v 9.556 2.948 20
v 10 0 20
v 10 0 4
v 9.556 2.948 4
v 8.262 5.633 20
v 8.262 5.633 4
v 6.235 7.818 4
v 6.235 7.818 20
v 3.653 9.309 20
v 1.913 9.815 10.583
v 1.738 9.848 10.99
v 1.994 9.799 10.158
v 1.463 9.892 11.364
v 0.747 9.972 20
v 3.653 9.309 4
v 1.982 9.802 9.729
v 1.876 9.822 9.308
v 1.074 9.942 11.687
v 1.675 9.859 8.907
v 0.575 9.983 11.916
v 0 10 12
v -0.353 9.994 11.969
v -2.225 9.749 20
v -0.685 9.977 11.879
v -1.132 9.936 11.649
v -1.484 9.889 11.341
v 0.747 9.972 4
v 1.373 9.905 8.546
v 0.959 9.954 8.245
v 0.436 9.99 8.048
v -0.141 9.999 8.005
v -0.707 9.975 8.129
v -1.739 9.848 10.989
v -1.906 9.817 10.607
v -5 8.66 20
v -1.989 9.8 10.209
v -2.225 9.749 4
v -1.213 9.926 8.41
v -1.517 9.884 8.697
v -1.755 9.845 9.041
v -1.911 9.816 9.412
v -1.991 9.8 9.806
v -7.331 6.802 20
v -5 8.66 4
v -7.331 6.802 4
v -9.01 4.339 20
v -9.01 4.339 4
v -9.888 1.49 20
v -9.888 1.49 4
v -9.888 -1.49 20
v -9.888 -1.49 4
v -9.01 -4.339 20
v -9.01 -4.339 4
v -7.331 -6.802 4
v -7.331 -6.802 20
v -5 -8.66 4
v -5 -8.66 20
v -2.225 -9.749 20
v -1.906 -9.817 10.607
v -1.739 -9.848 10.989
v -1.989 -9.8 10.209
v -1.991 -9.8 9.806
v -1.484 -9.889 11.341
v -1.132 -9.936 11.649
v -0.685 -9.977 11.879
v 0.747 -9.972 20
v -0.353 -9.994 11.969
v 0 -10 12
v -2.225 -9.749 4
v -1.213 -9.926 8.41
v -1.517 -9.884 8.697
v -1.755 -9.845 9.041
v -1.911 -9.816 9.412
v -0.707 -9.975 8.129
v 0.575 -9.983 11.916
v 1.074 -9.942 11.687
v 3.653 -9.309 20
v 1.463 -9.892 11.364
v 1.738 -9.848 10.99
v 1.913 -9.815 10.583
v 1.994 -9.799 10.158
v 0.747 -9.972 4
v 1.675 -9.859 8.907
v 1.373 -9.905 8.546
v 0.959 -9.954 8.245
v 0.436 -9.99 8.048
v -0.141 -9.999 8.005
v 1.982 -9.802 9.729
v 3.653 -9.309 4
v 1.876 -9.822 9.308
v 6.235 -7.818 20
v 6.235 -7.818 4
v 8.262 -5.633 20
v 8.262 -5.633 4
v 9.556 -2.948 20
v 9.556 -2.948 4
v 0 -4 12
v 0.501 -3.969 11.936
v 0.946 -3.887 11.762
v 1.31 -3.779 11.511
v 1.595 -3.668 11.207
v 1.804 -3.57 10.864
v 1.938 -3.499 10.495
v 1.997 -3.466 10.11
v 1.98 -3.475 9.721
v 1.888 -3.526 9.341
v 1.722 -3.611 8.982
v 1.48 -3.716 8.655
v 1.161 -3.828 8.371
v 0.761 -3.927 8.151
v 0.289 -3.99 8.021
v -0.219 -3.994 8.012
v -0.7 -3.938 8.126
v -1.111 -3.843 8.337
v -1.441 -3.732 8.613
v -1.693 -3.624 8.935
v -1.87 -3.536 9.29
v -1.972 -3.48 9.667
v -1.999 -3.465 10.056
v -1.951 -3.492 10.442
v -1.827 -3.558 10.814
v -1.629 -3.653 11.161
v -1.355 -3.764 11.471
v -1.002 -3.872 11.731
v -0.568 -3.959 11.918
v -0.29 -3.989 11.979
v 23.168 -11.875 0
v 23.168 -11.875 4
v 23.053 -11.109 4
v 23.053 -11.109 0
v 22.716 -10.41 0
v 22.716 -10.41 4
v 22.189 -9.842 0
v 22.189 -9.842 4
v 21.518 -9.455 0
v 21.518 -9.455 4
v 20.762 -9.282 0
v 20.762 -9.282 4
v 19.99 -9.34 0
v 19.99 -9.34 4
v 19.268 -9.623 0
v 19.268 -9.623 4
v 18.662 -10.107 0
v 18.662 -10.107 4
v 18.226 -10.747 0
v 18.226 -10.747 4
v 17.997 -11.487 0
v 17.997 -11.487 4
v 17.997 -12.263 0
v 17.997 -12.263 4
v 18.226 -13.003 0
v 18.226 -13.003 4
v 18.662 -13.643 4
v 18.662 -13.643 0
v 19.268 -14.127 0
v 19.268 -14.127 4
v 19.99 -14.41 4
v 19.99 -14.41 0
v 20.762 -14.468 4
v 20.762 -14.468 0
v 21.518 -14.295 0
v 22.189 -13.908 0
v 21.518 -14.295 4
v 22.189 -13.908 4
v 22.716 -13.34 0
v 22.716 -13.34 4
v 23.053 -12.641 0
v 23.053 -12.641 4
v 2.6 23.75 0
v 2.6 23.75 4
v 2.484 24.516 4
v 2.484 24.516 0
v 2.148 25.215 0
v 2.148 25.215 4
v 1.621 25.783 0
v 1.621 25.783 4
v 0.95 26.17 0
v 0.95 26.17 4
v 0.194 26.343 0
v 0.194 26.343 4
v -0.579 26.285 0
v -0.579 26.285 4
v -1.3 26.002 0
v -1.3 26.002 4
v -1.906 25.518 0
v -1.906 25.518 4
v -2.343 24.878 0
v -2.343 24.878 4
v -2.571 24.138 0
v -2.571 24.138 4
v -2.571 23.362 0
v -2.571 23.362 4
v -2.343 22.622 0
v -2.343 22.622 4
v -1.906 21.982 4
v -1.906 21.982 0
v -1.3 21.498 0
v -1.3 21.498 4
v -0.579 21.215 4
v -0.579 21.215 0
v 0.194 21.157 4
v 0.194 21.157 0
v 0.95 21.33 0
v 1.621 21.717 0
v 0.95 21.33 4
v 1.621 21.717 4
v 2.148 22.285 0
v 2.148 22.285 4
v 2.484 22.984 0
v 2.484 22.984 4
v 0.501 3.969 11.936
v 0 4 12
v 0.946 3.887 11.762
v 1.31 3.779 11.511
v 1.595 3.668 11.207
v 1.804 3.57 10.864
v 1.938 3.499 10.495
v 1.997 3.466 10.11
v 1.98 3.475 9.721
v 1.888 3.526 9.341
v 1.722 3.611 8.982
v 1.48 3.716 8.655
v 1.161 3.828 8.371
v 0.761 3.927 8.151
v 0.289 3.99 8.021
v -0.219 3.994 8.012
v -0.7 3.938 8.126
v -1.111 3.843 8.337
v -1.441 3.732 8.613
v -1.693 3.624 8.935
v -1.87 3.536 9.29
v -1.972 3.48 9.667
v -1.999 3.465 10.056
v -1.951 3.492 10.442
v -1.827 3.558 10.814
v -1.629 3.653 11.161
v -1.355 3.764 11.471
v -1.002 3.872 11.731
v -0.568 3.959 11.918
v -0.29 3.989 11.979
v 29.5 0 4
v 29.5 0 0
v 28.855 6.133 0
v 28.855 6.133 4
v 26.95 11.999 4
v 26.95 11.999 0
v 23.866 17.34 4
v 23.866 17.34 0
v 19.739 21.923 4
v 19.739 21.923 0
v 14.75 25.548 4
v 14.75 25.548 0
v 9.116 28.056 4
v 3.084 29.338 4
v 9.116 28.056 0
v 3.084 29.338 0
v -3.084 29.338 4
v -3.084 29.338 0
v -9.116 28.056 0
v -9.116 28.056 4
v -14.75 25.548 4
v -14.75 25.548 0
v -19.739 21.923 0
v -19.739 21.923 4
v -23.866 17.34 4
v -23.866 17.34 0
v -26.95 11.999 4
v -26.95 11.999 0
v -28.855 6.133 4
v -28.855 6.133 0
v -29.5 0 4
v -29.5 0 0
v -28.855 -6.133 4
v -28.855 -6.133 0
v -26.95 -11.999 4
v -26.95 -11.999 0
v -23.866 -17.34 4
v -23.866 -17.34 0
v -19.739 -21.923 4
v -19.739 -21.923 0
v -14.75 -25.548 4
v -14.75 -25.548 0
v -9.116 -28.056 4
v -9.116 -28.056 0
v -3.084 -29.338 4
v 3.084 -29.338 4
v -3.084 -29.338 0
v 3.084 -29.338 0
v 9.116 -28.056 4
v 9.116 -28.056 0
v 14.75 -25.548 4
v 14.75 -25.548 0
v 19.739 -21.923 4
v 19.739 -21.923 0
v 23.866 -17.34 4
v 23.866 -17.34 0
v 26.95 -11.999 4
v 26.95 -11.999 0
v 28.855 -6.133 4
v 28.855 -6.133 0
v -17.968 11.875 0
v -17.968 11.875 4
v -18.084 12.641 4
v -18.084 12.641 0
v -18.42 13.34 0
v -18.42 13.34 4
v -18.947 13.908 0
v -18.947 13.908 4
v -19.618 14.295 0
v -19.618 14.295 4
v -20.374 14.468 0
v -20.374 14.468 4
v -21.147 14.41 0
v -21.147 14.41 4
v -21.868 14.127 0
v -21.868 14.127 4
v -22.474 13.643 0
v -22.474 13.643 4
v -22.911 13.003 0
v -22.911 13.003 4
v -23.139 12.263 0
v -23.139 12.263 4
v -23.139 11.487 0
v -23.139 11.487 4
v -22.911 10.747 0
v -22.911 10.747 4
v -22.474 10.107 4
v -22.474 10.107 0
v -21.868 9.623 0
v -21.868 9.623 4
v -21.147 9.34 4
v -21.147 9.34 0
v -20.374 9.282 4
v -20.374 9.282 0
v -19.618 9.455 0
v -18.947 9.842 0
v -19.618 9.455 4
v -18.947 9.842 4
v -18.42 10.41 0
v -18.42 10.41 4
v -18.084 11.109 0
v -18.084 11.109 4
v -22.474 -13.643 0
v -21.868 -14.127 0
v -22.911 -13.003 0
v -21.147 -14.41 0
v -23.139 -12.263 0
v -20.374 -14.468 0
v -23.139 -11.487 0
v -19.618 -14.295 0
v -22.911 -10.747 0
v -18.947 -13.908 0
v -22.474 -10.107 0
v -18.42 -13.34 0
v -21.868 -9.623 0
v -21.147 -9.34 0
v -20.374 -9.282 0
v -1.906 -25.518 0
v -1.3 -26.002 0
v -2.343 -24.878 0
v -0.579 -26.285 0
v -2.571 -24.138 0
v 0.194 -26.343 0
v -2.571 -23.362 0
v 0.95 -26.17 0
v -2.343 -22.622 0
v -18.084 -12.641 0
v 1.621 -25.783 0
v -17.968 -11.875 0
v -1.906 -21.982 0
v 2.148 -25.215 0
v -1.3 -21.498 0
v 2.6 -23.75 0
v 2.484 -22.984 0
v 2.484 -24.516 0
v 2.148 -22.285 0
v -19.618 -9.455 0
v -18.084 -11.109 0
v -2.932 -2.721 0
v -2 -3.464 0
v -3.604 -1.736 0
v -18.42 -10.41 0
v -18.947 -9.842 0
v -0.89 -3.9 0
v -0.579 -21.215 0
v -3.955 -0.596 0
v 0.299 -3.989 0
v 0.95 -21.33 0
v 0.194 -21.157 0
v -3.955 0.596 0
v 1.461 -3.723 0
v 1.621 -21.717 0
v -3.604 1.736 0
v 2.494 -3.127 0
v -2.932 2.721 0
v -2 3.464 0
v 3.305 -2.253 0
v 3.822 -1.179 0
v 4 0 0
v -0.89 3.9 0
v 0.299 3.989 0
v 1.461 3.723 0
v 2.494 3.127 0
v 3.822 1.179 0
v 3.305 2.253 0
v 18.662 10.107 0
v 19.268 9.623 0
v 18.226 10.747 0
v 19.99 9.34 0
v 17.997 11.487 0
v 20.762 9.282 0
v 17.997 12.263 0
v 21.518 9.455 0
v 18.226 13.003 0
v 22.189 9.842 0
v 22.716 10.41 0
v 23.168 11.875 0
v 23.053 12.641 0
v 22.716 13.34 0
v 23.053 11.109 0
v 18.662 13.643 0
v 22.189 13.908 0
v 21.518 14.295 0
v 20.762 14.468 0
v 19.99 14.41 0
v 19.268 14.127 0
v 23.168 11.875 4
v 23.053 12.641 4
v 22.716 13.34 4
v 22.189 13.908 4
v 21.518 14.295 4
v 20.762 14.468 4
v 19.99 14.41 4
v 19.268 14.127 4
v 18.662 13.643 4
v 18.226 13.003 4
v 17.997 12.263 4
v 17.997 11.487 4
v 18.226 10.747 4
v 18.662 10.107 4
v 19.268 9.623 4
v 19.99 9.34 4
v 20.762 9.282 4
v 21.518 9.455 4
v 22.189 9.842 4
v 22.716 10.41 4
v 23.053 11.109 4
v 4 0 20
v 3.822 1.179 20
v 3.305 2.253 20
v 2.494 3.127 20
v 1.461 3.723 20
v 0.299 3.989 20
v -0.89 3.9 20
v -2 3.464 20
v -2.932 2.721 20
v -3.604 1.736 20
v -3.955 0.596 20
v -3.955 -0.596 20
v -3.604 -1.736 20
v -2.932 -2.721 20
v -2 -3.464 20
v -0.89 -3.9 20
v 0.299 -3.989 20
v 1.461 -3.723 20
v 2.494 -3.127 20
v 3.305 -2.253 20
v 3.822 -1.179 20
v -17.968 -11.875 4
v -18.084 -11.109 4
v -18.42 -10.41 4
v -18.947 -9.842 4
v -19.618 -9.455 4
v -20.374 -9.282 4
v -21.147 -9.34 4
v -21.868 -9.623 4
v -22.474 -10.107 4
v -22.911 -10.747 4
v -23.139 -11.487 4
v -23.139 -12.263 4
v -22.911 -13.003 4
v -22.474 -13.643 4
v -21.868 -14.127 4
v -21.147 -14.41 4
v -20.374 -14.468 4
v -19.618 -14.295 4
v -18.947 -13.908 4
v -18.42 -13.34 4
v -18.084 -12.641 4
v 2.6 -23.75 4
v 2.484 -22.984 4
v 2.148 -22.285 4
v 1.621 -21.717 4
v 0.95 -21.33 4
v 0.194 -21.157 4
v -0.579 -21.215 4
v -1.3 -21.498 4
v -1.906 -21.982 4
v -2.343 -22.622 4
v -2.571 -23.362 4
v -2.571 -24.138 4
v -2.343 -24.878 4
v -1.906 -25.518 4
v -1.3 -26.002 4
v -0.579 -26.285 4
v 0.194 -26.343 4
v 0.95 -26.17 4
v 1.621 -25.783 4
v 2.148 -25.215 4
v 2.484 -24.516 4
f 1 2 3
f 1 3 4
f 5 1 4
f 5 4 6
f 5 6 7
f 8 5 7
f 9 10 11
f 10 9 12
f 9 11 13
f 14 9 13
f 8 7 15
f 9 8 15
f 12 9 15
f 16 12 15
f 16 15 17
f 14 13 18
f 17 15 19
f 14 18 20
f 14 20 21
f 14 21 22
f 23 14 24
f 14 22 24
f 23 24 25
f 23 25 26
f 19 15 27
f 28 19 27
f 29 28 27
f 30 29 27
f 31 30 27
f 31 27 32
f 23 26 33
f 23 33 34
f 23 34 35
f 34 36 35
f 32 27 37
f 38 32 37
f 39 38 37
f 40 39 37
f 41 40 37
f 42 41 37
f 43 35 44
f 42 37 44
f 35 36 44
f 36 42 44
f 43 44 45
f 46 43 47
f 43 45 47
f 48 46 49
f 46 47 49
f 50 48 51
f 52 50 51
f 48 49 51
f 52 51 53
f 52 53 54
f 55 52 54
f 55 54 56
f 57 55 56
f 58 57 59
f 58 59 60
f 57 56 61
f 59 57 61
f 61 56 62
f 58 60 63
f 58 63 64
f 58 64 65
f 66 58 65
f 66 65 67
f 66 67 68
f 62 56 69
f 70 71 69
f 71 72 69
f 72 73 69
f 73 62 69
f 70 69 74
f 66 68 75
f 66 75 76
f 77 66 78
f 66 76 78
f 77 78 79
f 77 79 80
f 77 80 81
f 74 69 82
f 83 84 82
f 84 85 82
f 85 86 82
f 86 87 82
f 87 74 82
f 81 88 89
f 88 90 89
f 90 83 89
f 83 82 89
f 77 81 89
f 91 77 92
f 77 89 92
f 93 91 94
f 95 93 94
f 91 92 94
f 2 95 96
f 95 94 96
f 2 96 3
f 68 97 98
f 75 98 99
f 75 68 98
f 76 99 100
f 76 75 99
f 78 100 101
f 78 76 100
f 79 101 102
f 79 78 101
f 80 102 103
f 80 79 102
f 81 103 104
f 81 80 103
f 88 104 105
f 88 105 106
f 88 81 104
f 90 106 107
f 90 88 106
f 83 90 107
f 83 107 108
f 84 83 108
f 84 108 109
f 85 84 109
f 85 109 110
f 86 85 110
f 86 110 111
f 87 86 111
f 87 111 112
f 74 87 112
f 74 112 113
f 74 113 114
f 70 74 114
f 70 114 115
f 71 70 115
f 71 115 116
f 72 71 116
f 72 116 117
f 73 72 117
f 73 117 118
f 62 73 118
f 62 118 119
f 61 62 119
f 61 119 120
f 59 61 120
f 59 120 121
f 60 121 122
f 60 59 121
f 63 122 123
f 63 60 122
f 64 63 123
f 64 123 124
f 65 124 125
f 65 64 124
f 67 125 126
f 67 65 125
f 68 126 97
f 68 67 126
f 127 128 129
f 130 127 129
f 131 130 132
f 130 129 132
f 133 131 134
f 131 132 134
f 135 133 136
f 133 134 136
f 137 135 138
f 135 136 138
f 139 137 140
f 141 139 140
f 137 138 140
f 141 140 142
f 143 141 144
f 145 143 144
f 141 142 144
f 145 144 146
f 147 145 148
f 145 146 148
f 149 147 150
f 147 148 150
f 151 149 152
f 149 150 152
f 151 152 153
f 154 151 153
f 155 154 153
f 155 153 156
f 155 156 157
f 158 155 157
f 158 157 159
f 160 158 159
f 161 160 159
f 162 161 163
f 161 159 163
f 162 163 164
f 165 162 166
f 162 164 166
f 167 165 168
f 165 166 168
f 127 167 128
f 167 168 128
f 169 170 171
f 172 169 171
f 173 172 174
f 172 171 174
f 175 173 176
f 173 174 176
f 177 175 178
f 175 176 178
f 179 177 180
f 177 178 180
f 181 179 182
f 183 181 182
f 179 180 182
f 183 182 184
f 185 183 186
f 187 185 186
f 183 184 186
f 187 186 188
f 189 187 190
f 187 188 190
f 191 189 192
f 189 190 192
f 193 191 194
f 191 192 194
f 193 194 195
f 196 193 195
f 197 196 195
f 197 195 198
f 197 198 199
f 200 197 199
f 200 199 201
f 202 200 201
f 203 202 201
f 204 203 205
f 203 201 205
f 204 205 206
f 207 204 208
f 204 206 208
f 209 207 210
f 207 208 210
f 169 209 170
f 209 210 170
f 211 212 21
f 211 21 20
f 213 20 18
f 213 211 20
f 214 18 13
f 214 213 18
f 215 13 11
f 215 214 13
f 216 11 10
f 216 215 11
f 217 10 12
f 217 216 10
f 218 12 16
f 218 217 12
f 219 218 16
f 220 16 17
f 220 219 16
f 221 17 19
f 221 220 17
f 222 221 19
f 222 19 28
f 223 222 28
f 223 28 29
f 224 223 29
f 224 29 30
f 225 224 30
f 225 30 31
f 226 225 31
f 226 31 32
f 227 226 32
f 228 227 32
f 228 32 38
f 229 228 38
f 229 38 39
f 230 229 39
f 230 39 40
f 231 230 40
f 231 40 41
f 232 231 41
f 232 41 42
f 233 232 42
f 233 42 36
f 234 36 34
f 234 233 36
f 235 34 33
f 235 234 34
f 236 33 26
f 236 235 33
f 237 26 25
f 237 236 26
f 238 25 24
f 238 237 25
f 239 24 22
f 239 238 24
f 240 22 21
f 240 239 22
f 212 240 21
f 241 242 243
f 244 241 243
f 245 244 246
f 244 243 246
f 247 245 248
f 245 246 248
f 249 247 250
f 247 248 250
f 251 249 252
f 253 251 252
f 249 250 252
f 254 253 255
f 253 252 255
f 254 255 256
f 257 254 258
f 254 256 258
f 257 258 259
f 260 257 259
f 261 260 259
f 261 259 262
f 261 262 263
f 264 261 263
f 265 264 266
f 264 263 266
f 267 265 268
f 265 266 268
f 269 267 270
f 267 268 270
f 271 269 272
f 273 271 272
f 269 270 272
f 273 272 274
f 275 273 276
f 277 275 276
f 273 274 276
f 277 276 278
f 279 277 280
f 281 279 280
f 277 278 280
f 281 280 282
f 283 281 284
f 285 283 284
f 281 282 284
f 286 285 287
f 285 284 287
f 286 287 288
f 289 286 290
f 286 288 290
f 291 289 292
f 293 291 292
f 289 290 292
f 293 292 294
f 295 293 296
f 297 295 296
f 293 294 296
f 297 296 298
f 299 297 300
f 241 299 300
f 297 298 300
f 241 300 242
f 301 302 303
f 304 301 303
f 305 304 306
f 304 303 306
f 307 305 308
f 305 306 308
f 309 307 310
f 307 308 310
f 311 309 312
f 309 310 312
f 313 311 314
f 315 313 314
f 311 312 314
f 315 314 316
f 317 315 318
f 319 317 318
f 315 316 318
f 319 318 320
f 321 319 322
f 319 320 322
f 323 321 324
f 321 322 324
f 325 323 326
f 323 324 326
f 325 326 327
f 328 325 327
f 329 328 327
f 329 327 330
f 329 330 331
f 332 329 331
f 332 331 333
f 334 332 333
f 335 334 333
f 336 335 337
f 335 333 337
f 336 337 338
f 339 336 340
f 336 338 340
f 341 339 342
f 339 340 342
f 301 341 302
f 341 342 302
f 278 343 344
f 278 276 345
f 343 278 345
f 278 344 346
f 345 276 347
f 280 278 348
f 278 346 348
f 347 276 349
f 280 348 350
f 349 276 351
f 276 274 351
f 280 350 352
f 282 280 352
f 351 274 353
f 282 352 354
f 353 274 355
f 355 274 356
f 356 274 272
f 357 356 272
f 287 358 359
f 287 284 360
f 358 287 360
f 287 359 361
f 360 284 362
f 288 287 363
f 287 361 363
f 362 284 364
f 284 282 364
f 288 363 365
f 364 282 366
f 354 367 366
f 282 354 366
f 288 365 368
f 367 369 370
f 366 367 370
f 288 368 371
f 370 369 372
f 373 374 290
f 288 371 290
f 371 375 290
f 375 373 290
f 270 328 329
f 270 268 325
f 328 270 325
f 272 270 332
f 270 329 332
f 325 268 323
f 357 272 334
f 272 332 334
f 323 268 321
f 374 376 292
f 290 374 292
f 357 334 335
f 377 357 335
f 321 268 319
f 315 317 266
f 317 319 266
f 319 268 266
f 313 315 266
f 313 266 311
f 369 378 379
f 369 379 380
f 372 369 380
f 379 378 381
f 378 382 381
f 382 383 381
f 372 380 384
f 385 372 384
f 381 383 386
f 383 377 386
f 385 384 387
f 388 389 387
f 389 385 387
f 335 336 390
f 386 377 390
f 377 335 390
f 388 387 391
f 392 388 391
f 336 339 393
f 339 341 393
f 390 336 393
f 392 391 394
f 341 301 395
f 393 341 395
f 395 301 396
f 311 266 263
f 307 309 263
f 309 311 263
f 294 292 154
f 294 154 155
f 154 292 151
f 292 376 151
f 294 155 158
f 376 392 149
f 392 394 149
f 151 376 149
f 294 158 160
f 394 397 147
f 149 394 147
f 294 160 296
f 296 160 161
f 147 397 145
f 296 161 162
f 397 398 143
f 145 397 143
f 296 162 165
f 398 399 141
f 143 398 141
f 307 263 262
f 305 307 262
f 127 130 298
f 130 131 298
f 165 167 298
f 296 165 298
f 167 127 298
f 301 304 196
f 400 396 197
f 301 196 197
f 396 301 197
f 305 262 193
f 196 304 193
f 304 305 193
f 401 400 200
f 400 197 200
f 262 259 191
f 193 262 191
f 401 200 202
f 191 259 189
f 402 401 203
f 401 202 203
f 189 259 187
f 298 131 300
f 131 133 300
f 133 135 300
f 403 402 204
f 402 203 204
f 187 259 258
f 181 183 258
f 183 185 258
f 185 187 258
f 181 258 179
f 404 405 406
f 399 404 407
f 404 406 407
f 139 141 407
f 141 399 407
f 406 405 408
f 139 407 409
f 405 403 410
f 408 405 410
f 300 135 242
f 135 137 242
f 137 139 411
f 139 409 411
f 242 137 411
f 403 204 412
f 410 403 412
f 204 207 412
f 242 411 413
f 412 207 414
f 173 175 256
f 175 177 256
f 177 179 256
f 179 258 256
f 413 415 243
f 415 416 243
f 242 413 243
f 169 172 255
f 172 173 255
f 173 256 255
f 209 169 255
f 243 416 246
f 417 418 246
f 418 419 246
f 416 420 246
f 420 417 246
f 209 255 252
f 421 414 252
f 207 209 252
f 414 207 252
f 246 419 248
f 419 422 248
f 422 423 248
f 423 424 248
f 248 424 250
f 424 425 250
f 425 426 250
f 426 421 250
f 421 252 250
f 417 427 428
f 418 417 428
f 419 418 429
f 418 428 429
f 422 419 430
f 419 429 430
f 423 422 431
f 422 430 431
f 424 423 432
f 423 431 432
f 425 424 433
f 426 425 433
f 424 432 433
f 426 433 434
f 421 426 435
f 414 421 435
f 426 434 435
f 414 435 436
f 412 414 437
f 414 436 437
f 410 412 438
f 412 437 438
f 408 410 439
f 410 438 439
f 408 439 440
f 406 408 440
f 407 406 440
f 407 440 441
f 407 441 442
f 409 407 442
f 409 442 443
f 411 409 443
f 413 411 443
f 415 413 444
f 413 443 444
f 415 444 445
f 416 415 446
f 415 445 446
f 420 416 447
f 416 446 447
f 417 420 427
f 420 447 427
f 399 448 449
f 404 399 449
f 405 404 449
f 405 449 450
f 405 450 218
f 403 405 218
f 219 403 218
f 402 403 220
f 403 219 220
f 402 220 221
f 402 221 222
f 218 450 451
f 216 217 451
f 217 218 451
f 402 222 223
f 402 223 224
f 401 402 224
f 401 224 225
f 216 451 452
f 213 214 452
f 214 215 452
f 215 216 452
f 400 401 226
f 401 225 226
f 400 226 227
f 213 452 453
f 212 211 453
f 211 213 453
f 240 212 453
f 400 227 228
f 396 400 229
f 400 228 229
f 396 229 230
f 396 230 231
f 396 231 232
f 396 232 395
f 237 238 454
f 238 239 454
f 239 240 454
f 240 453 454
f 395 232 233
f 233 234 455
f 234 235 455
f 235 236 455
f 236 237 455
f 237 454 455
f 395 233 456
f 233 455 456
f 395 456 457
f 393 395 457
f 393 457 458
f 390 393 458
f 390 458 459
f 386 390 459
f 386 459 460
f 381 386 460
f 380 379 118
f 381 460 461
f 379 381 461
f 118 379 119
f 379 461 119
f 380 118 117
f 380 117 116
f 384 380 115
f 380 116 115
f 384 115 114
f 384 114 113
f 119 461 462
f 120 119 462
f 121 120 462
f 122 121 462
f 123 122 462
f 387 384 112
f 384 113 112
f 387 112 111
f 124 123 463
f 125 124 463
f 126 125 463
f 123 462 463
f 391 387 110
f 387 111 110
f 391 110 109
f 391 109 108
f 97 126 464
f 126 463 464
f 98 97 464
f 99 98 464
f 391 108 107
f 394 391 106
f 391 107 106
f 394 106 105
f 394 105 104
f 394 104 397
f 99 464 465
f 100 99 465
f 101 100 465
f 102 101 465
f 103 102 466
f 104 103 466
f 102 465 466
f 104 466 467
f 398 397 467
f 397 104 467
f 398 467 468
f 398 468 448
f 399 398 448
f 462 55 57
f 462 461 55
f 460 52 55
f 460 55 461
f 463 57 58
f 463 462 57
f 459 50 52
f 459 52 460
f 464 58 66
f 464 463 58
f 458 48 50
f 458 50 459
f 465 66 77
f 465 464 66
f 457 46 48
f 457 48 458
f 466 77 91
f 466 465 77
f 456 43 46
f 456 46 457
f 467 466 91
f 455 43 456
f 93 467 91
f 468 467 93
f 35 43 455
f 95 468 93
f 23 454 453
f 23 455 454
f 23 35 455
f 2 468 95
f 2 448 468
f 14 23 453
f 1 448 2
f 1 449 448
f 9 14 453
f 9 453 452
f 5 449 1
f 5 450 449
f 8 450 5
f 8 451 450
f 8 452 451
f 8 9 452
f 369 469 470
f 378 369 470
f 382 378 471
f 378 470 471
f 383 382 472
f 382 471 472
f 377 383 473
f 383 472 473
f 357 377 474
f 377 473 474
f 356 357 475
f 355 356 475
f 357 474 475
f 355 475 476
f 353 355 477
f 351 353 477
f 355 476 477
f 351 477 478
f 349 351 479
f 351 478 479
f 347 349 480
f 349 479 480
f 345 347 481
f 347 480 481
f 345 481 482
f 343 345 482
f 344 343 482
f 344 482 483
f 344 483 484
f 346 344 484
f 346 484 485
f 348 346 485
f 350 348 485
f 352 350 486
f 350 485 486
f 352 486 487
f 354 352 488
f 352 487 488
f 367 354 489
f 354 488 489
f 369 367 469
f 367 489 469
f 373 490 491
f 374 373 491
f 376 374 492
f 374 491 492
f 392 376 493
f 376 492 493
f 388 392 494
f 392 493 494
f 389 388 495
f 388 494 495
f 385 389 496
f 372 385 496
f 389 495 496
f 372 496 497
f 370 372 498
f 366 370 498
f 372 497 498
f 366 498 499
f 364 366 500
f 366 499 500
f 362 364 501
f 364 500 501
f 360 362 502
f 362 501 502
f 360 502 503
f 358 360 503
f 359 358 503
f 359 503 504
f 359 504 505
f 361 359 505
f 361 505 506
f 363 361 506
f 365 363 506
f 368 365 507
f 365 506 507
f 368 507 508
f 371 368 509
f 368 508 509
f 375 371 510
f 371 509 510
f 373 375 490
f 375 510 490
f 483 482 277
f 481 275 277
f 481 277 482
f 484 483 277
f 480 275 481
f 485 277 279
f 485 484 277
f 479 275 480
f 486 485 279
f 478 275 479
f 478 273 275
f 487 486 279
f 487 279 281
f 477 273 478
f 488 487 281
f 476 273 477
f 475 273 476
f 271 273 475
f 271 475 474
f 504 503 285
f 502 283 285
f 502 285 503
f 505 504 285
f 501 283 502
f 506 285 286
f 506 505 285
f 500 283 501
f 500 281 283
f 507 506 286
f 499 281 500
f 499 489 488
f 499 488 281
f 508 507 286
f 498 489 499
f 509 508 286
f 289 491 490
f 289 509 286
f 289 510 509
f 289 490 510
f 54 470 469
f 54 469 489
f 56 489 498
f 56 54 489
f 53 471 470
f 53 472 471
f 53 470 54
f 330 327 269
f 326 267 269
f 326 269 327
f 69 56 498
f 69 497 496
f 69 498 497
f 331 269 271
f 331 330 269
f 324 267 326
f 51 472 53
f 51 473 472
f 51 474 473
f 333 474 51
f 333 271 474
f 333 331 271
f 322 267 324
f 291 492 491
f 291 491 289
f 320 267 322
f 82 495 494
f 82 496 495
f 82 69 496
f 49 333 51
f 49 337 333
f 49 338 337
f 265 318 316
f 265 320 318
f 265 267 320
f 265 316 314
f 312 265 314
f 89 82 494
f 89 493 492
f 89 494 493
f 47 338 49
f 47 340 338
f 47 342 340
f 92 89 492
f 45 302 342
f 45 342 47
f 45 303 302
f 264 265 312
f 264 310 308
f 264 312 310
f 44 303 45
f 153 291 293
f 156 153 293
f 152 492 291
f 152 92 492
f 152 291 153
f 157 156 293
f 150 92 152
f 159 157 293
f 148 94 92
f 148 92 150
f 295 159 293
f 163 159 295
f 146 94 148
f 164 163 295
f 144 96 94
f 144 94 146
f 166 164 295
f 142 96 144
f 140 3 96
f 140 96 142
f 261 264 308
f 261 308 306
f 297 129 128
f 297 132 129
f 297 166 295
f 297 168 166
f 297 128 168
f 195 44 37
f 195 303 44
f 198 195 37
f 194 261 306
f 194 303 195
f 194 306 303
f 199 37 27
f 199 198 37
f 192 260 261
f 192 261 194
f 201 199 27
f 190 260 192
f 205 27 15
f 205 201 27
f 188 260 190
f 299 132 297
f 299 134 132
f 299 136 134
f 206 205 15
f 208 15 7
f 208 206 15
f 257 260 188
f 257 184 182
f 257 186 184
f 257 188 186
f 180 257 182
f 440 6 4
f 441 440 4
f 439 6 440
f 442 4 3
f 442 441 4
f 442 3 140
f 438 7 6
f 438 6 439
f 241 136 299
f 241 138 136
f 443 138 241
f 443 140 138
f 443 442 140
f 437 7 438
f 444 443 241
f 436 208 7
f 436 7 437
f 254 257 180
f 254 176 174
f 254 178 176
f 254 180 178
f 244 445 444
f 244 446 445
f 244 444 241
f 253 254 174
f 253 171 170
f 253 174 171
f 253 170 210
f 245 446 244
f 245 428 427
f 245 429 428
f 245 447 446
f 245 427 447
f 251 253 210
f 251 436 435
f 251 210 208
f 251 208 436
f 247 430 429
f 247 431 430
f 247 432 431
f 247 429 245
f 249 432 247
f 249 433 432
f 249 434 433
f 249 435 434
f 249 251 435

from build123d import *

# Parameters (mm, degrees)
SKETCH1_R               = 29.5
BOSS_EXTRUDE1_DEPTH     = 4
SKETCH2_R               = 10
BOSS_EXTRUDE2_DEPTH     = 16
SKETCH3_R               = 4
CUT_EXTRUDE1_DEPTH      = 20
SKETCH4_R               = 2.6
CUT_EXTRUDE2_DEPTH      = 4
CUT_EXTRUDE3_DEPTH      = 47.265537931
CUT_EXTRUDE3_DEPTH_BACK = 47.265537931
SKETCH5_R               = 2


with BuildPart() as part:
    # Sketch1 → Boss-Extrude1 (new body)
    with BuildSketch(Plane.XY):
        Circle(SKETCH1_R)
    extrude(amount=BOSS_EXTRUDE1_DEPTH)

    # Sketch2 → Boss-Extrude2 (add)
    with BuildSketch(Plane.XY.offset(4)):
        Circle(SKETCH2_R)
    extrude(amount=BOSS_EXTRUDE2_DEPTH)

    # Sketch3 → Cut-Extrude1 (cut)
    with BuildSketch(Plane.XY.offset(20)):
        Circle(SKETCH3_R)
    extrude(amount=-CUT_EXTRUDE1_DEPTH, mode=Mode.SUBTRACT)

    # Sketch4 → Cut-Extrude2 (cut)
    with BuildSketch(Plane.XY.offset(4)):
        with Locations((0, 23.75)):
            Circle(SKETCH4_R)
        with Locations((20.56810334, 11.875)):
            Circle(SKETCH4_R)
        with Locations((20.56810334, -11.875)):
            Circle(SKETCH4_R)
        with Locations((0, -23.75)):
            Circle(SKETCH4_R)
        with Locations((-20.56810334, -11.875)):
            Circle(SKETCH4_R)
        with Locations((-20.56810334, 11.875)):
            Circle(SKETCH4_R)
    extrude(amount=-CUT_EXTRUDE2_DEPTH, mode=Mode.SUBTRACT)

    # Sketch5 → Cut-Extrude3 (cut, two sides: drawn at the far end of the back side and taken through both)
    with BuildSketch(Plane(origin=(0, 0, 0), x_dir=(1, 0, 0), z_dir=(0, 1, 0)).offset(-CUT_EXTRUDE3_DEPTH_BACK)):
        with Locations(Location((0, -10, 0), (0, 0, 270))):
            Circle(SKETCH5_R)
    extrude(amount=CUT_EXTRUDE3_DEPTH + CUT_EXTRUDE3_DEPTH_BACK, mode=Mode.SUBTRACT)


solid = part.part
